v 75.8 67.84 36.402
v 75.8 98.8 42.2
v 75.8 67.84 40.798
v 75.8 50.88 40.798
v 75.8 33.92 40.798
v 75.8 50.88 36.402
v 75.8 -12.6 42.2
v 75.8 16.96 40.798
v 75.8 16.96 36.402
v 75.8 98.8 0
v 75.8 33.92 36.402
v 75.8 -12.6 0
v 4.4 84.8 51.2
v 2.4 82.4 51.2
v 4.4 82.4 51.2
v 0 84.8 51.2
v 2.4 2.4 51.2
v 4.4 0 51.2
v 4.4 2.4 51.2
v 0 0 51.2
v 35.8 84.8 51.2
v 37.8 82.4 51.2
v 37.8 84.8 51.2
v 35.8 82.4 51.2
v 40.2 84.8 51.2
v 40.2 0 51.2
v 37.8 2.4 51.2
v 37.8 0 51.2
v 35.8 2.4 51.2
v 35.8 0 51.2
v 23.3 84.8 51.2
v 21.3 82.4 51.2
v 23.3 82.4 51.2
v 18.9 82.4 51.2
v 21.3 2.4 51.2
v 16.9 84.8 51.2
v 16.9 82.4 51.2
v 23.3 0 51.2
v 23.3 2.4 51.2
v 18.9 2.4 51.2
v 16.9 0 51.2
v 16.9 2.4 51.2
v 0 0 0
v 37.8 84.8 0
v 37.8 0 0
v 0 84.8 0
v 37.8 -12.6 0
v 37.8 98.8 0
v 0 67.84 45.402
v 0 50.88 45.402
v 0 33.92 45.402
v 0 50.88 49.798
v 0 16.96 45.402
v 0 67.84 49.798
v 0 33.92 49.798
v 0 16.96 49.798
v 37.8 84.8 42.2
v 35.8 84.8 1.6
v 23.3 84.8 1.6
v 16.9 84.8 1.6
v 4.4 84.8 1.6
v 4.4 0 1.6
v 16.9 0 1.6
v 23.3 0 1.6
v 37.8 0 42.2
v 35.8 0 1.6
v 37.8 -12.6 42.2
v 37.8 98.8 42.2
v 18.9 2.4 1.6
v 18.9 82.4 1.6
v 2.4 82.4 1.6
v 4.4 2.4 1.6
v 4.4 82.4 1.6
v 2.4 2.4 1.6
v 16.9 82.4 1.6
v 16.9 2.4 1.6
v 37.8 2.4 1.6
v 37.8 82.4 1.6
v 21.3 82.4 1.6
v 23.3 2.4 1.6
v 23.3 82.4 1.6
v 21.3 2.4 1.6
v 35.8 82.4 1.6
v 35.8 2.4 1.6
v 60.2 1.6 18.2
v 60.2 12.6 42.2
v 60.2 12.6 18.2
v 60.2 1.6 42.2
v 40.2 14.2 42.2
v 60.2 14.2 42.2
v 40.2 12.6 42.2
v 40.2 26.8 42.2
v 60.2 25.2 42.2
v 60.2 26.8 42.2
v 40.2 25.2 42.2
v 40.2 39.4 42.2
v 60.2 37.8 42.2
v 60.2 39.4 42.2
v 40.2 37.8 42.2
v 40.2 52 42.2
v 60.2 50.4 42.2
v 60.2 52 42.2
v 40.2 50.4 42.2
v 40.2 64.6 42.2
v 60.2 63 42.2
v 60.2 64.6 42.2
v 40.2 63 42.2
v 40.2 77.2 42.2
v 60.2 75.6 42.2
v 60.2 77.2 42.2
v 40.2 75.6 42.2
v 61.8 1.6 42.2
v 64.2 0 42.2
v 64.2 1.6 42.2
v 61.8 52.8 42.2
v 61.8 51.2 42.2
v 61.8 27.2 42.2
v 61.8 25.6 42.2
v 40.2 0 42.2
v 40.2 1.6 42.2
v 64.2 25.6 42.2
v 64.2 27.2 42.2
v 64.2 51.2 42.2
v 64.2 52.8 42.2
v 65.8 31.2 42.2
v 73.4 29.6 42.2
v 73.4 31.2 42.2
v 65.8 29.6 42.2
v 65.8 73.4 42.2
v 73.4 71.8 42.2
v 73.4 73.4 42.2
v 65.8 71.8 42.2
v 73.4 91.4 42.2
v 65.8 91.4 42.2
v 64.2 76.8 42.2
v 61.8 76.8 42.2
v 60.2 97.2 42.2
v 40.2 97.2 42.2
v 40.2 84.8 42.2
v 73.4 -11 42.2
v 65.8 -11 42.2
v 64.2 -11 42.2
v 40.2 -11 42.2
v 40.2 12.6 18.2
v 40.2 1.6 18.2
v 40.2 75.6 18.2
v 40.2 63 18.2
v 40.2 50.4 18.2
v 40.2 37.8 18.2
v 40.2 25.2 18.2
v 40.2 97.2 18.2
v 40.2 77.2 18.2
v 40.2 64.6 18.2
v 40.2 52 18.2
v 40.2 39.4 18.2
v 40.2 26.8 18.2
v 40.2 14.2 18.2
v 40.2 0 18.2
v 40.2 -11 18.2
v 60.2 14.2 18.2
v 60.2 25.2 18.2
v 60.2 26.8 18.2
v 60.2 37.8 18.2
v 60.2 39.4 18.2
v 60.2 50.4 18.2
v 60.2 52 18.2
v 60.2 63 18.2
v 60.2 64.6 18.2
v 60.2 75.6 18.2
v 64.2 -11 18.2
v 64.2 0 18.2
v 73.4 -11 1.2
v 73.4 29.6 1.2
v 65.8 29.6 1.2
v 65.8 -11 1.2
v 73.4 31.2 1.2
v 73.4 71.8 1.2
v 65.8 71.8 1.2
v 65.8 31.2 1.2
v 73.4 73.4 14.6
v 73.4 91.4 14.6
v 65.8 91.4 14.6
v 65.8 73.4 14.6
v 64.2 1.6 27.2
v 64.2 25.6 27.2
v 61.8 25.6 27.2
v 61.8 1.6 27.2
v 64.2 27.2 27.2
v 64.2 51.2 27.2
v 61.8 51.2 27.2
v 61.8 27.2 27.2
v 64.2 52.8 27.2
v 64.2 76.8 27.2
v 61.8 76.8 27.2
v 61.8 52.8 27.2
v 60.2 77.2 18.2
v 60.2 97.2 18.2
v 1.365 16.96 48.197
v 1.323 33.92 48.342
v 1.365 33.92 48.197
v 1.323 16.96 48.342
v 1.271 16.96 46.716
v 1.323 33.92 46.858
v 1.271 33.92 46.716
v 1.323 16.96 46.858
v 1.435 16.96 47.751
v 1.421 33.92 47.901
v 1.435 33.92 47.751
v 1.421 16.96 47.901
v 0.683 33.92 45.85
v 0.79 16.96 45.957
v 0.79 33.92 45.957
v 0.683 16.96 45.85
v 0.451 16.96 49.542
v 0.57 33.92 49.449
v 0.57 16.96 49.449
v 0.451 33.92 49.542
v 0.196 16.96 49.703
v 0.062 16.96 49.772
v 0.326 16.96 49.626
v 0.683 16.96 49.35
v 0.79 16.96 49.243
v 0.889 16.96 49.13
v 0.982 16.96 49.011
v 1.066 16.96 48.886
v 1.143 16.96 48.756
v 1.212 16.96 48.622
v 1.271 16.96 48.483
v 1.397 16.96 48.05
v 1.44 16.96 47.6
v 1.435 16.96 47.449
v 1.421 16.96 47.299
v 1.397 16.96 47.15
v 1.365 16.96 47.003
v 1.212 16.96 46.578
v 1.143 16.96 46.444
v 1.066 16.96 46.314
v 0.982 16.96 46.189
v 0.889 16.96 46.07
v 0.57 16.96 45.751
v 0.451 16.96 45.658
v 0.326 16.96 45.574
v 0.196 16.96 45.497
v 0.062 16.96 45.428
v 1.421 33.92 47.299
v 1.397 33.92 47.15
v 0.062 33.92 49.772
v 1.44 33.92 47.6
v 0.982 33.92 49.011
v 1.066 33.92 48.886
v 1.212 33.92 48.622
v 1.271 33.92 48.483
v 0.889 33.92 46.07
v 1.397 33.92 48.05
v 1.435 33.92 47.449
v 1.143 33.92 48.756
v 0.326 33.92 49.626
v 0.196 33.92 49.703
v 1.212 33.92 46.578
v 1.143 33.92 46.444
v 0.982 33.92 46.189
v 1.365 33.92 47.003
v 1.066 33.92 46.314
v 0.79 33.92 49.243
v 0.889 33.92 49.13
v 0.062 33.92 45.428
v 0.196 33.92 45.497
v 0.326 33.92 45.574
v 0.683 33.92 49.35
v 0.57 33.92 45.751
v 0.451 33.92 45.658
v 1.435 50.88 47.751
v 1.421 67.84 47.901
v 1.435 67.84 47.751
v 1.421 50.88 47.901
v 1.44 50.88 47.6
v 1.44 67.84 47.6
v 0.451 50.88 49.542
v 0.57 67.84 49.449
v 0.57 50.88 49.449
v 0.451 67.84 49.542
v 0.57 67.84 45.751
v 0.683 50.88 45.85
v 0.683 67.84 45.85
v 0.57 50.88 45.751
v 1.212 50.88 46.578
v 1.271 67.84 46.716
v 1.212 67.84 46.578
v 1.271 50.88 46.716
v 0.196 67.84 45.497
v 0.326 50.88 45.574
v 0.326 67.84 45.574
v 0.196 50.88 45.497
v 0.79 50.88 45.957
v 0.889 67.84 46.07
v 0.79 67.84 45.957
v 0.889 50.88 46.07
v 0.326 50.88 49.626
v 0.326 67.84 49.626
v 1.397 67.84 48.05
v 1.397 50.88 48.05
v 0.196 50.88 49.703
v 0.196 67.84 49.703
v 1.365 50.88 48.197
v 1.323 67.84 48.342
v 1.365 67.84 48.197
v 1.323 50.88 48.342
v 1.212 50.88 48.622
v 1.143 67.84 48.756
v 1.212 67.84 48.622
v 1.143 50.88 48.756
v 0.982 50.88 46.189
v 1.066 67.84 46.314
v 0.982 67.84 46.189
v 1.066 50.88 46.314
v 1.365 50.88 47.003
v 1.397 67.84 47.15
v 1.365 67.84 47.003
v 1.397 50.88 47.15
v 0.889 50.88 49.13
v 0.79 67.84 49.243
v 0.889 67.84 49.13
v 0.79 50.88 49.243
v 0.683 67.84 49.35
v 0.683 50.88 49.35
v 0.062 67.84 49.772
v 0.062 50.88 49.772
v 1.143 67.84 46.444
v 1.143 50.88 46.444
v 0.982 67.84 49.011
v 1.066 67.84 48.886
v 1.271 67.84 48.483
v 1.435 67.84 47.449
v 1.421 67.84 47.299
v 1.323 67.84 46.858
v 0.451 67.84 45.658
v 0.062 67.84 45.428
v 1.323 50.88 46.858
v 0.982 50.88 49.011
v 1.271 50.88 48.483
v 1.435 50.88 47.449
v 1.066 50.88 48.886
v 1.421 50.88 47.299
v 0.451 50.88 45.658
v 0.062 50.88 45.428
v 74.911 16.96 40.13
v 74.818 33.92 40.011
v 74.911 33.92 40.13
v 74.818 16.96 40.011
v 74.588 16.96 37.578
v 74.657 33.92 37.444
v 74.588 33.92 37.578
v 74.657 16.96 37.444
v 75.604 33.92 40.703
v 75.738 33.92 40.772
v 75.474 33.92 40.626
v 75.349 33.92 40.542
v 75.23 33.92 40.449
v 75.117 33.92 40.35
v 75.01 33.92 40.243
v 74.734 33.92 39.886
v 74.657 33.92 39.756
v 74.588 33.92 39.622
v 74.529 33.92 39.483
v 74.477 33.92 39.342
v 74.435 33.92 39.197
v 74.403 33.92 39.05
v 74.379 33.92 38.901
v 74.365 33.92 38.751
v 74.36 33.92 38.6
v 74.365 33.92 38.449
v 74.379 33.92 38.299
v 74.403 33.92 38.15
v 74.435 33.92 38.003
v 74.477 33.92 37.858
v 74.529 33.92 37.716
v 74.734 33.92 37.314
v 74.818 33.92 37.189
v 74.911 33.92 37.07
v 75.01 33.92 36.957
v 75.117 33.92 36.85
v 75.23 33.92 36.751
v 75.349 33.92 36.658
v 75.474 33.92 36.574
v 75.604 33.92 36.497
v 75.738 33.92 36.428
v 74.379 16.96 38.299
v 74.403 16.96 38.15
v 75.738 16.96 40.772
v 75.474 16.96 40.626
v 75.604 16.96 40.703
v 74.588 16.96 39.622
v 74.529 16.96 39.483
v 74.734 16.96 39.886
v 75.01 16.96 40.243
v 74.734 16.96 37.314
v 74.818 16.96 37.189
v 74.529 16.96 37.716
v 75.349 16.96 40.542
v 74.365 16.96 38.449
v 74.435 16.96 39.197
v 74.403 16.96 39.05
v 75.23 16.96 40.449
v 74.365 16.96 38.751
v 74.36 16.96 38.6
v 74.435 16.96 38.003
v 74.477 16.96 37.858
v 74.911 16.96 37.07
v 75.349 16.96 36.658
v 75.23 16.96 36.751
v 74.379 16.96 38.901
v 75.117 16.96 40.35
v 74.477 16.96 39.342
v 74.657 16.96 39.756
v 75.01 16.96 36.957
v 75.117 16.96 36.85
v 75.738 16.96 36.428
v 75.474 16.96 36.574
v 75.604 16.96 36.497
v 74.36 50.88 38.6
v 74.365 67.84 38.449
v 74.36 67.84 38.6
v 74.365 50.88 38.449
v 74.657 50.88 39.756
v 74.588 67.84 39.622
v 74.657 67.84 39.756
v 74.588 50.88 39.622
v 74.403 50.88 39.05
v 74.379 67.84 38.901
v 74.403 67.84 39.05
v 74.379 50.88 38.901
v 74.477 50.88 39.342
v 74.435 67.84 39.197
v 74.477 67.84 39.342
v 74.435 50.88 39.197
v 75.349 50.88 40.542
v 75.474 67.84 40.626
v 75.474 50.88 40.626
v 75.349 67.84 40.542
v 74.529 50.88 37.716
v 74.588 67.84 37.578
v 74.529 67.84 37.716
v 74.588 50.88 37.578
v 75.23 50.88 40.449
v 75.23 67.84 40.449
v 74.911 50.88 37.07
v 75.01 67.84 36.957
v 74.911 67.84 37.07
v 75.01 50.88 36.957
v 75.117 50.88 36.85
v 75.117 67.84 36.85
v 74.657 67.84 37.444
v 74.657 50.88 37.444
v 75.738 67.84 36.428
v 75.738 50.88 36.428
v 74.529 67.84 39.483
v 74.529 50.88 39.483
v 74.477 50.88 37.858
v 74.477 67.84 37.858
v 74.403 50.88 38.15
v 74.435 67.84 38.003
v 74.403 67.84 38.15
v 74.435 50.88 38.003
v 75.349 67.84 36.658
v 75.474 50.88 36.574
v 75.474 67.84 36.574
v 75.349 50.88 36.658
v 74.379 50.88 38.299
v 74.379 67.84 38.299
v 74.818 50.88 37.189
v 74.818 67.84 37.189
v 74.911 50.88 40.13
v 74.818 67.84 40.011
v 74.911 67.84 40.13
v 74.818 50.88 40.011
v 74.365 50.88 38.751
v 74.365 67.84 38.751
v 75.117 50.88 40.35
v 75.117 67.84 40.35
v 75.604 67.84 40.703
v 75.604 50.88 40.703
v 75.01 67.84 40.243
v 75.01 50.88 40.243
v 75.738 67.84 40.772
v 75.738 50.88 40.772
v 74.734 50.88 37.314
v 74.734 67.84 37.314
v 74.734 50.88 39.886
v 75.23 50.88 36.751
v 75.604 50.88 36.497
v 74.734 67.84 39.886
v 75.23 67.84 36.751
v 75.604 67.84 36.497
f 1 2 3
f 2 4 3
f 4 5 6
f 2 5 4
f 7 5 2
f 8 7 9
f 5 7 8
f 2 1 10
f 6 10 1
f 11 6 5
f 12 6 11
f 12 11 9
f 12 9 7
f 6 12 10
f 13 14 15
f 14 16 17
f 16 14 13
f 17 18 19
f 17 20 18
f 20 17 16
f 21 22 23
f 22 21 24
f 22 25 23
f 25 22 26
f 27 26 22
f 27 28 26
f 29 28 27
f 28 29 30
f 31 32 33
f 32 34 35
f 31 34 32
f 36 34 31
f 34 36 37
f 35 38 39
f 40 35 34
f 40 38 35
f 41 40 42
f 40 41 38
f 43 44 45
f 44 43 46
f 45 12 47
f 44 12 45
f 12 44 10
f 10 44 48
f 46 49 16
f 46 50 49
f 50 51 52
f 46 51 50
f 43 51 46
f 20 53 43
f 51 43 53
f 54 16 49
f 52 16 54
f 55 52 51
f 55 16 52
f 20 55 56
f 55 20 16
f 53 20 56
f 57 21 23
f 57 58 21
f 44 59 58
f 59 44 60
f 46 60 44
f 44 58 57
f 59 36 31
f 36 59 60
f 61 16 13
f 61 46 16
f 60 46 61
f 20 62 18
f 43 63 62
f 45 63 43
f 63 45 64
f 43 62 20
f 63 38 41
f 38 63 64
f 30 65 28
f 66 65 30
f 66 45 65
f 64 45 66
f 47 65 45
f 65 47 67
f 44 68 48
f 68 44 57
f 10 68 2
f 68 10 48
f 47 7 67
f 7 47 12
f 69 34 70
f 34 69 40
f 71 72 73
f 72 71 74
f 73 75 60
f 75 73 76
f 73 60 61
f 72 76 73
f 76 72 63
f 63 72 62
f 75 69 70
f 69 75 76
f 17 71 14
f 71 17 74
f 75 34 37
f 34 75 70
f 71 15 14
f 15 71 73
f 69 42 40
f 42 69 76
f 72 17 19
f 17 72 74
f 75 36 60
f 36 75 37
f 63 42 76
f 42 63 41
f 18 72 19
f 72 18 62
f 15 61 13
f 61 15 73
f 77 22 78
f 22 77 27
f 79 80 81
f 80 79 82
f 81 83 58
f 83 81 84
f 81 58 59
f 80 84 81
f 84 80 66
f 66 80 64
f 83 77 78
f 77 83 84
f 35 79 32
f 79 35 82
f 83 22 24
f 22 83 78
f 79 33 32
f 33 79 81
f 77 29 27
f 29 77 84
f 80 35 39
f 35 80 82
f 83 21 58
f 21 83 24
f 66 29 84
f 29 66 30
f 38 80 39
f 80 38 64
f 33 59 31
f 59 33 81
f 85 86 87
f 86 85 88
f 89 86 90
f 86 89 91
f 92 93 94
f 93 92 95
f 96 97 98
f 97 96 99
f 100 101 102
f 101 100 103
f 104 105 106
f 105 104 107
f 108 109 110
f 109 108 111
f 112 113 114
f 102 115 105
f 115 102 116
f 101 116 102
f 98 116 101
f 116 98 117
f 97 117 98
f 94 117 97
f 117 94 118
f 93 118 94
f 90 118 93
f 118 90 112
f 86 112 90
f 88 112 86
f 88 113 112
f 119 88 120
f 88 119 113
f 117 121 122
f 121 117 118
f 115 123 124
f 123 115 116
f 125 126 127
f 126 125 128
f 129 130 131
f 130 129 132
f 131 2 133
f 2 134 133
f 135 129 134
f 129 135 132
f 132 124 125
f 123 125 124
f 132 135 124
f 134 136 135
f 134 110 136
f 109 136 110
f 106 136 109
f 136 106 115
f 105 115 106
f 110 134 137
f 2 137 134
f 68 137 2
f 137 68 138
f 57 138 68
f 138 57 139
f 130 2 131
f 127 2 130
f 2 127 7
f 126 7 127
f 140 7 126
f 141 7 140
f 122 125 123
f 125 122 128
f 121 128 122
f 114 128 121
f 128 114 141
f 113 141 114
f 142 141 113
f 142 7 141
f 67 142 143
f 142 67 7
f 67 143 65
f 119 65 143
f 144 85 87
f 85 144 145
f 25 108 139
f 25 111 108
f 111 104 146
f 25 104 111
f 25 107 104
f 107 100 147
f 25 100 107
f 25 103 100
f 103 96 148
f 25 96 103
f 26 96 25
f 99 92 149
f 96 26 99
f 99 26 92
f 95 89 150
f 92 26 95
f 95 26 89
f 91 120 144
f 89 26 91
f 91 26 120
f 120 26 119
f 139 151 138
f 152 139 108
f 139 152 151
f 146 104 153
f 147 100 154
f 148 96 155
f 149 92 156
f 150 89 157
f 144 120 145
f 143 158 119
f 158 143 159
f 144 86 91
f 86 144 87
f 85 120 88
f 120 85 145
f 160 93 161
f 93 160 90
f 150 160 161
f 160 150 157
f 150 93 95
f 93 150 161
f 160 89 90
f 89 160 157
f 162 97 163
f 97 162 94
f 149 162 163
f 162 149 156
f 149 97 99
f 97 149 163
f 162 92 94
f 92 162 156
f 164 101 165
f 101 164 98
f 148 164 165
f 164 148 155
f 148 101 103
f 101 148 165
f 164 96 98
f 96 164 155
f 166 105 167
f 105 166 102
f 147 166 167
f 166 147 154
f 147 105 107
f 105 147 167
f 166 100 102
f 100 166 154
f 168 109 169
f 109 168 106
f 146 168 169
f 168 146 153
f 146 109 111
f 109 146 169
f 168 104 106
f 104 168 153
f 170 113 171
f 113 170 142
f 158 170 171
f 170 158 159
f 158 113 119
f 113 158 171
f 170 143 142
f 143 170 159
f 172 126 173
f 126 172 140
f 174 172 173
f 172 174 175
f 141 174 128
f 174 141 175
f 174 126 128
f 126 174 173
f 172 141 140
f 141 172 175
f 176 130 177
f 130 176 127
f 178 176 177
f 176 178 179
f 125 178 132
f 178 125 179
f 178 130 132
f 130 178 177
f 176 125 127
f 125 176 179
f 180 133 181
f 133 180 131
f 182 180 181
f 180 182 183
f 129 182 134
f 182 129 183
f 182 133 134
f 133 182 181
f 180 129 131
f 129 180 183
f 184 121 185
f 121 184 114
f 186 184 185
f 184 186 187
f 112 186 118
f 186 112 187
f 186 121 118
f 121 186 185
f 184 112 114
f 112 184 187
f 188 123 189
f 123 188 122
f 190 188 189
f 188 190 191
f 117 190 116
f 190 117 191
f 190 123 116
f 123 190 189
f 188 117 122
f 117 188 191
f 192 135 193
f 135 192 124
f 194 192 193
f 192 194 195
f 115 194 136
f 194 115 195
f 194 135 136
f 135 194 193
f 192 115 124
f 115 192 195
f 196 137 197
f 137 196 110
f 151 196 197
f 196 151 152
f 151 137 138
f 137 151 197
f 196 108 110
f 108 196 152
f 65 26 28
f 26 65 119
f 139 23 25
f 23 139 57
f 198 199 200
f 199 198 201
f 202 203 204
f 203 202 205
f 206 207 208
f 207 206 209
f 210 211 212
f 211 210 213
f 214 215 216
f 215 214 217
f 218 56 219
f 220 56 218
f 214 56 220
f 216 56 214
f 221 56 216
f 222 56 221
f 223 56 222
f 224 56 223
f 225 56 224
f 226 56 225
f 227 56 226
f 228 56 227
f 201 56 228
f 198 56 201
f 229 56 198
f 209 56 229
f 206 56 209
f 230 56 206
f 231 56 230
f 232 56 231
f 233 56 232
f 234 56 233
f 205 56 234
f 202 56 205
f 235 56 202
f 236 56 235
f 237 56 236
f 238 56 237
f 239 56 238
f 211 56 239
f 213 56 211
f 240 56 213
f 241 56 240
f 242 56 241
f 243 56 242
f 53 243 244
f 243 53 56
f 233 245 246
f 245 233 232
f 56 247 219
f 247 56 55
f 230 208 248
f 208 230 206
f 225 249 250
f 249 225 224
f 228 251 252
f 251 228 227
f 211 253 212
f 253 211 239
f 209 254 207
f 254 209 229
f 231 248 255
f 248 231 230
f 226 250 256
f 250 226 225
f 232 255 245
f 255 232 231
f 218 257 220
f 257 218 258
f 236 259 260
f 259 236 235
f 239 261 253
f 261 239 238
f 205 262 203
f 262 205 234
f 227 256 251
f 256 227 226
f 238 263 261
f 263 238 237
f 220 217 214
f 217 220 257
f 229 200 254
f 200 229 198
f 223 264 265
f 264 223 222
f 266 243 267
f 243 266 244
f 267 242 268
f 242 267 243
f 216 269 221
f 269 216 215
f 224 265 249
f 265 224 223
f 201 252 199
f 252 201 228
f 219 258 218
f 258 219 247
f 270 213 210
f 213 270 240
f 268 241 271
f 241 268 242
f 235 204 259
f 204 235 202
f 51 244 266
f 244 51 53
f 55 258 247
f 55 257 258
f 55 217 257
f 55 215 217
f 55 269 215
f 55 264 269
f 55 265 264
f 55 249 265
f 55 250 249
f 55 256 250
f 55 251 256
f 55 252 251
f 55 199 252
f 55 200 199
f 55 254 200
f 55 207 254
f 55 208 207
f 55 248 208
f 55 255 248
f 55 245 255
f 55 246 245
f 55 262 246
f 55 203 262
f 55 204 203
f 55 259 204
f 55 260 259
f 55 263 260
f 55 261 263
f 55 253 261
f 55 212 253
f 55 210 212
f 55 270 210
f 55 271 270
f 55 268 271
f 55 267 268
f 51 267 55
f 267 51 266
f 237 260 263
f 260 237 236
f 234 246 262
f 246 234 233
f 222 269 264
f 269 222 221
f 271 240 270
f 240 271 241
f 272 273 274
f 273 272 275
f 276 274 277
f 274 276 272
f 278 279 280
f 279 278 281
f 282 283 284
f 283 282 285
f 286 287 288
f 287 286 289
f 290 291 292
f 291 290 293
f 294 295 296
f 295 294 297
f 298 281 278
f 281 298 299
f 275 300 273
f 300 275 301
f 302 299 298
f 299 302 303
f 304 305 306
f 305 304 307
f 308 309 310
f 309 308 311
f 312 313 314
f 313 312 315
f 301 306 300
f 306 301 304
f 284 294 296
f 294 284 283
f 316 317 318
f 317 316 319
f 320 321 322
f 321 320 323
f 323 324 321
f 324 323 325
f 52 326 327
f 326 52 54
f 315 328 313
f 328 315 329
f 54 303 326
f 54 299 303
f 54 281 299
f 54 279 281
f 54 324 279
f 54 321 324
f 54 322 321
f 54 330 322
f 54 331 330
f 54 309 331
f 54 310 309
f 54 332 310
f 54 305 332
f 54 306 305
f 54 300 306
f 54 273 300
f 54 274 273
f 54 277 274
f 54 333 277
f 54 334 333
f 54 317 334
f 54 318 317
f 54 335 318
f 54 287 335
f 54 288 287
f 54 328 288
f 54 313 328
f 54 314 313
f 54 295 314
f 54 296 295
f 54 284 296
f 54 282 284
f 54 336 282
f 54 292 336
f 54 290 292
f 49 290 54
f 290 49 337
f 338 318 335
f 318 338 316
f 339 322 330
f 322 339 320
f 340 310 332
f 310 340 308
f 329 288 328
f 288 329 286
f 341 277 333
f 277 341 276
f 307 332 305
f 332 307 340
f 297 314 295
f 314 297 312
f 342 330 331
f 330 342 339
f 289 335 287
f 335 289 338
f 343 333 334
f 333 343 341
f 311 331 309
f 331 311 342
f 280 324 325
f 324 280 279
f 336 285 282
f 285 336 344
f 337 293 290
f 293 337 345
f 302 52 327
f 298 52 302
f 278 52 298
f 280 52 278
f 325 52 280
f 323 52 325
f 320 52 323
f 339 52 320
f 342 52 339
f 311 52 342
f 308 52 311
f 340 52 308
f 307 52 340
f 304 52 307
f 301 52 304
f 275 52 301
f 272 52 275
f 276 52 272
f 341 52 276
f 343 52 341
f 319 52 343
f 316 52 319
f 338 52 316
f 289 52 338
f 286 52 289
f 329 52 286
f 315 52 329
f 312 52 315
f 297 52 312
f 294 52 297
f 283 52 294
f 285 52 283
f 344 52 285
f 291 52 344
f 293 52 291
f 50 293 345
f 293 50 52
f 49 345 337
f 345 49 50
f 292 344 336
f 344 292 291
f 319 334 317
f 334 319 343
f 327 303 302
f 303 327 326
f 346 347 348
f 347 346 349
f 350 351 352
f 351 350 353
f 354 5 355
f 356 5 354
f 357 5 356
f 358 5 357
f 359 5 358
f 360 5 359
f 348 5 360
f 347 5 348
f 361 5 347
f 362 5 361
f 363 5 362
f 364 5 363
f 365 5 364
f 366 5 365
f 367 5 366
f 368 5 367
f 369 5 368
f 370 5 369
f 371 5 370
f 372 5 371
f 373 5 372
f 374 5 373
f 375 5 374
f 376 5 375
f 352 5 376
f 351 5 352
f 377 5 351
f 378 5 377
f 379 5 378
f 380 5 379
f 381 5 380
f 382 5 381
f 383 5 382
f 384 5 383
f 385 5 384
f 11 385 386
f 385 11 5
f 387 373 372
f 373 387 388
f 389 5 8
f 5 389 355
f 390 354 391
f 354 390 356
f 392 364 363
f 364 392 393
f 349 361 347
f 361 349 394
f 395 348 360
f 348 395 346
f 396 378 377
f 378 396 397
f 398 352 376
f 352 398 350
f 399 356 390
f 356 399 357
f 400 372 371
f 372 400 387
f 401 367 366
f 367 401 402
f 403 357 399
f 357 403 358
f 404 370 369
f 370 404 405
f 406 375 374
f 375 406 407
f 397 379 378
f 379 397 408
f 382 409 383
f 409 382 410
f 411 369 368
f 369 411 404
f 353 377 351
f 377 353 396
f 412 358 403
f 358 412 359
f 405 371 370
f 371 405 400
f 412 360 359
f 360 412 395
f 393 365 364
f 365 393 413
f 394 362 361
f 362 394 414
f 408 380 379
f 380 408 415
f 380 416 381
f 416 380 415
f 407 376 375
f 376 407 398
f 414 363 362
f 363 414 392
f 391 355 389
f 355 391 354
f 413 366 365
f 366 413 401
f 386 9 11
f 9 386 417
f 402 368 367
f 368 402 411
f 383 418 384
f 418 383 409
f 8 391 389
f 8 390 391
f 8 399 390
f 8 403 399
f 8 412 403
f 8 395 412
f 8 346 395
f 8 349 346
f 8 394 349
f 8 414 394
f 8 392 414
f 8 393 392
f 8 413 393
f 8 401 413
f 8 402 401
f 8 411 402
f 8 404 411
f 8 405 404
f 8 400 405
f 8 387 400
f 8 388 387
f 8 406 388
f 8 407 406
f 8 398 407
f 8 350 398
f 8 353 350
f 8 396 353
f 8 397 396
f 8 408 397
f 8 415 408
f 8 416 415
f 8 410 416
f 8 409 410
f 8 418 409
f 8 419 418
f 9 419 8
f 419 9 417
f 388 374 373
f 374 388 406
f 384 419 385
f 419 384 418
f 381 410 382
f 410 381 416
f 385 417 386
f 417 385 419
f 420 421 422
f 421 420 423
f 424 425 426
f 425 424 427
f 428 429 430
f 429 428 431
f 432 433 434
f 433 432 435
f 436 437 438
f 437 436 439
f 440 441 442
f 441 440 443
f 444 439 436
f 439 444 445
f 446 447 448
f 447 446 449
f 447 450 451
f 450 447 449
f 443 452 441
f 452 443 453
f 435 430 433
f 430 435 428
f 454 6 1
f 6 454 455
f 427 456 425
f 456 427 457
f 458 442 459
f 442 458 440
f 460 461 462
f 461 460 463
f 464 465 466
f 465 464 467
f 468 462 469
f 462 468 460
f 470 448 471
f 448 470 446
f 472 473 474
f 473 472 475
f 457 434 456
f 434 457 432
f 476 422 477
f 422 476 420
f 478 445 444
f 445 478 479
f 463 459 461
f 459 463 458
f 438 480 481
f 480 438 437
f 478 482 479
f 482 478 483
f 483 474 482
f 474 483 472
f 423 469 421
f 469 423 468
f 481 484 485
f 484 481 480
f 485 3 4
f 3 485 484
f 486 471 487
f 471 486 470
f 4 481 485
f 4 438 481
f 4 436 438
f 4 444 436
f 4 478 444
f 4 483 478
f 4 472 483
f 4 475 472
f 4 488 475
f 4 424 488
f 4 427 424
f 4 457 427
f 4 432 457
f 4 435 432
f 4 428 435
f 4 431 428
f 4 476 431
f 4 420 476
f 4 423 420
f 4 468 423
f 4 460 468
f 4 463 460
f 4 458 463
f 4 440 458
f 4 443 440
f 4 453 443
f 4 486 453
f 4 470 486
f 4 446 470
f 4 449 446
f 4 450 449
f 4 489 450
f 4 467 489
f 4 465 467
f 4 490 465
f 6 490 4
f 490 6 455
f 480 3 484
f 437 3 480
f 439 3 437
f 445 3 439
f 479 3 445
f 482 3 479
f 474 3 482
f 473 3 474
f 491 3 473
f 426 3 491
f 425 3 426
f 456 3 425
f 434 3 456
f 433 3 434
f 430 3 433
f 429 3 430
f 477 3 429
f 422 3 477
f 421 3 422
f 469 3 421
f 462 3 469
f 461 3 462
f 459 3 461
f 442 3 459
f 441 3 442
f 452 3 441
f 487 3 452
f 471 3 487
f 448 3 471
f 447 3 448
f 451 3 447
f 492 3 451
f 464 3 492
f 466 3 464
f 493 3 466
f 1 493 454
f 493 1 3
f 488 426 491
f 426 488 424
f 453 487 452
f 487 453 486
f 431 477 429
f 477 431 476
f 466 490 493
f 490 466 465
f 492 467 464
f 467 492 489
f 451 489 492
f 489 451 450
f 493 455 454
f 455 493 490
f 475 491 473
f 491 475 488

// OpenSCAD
// Written by xoque (mwifall@gmail.com)
/**************************************
Organizer for ESCAPE items - dice, meeples, character 
tokens, ghost, chalice, gems, and quest tokens
**************************************/

Thickness=1.6;  // Thickness of normal walls
ThicknessW=2.4; // Thickness of walls that the cover snaps into
Edge=2; // The edge of the dice storage
// Dice dimensions
DiceWidth=16.5;
// Meeple dimensions
MLength=20;
MWidth=11; 
MHeight=24;
MCutoff=9; // cutoff above meeples
// Ghost dimensions
GLength=24;
// Player token dimensions
PLength=40.6; //41
PWidth=7.6;
PThickness=1.2;  // Walls around player tokens
// Chalice dimensions
CDiameter=20;

// Quest marker dimensions
QDiameter=24;
QThickness=2.4;

// Gem token dimensions
GemLength=35;
GemWidth=18;

TLength=84.8;
//TotalLength=TLength+MWidth+2*Thickness+CDiameter;
TotalLength=9*Thickness+7*MWidth+CDiameter;
TWidth=4*ThicknessW+Thickness+2*DiceWidth+GLength+PWidth;
THeight=51.2;

// meeple hole = 20 x 11 x 21h (meeple is 30h)
// oval = 50 x 40 x 2.14

difference(){
    union() {
        cube([TWidth,TLength,THeight]);
        translate([2*DiceWidth+2*ThicknessW,-Thickness-MWidth,0]) {
            cube([GLength+2*ThicknessW+Thickness+PWidth,TotalLength,THeight]); }
    }
    translate([ThicknessW,ThicknessW,Thickness]) {
        cube([DiceWidth,TLength-2*ThicknessW,THeight]); }
    translate([ThicknessW+Edge,0,Thickness]) {
        cube([DiceWidth-2*Edge,TLength,THeight]); }
    translate([DiceWidth+2*ThicknessW,ThicknessW,Thickness]) {
        cube([DiceWidth,TLength-2*ThicknessW,THeight]); }
    translate([DiceWidth+2*ThicknessW+Edge,0,Thickness]) {
        cube([DiceWidth-2*Edge,TLength,THeight]); }

//Meeple cutouts
    translate([2*DiceWidth+3*ThicknessW,Thickness,THeight-MHeight-MCutoff]) {
        cube([MLength,MWidth,MHeight]); }
    translate([2*DiceWidth+3*ThicknessW,2*Thickness+MWidth,THeight-MHeight-MCutoff]) {
        cube([MLength,MWidth,MHeight]); }
    translate([2*DiceWidth+3*ThicknessW,3*Thickness+2*MWidth,THeight-MHeight-MCutoff]) {
        cube([MLength,MWidth,MHeight]); }
    translate([2*DiceWidth+3*ThicknessW,4*Thickness+3*MWidth,THeight-MHeight-MCutoff]) {
        cube([MLength,MWidth,MHeight]); }
    translate([2*DiceWidth+3*ThicknessW,5*Thickness+4*MWidth,THeight-MHeight-MCutoff]) {
        cube([MLength,MWidth,MHeight]); }
    translate([2*DiceWidth+3*ThicknessW,6*Thickness+5*MWidth,THeight-MHeight-MCutoff]) {
        cube([MLength,MWidth,MHeight]); }

// Ghost cutouts
    translate([2*DiceWidth+3*ThicknessW,-MWidth,THeight-MHeight-MCutoff]) {
        cube([GLength,MWidth,MHeight]); }

// Player adventurer token cutouts
    translate([2*DiceWidth+3*ThicknessW+Thickness+GLength,-MWidth,PThickness]) {
        cube([PWidth,PLength,THeight]); }
    translate([2*DiceWidth+3*ThicknessW+Thickness+GLength,-MWidth+Thickness+PLength,PThickness]) {
        cube([PWidth,PLength,THeight]); }

// Gem token cutout
    translate([2*DiceWidth+3*ThicknessW+Thickness+GLength,-MWidth+2*Thickness+2*PLength,THeight-GemLength-Thickness]) {
        cube([PWidth,GemWidth,THeight]); }

// Quest token cutout
    translate([2*DiceWidth+3*ThicknessW+MLength+Thickness,Thickness,THeight-QDiameter]) {
        cube([QThickness,QDiameter,QDiameter]); }
    translate([2*DiceWidth+3*ThicknessW+MLength+Thickness,QDiameter+2*Thickness,THeight-QDiameter]) {
        cube([QThickness,QDiameter,QDiameter]); }
    translate([2*DiceWidth+3*ThicknessW+MLength+Thickness,2*QDiameter+3*Thickness,THeight-QDiameter]) {
        cube([QThickness,QDiameter,QDiameter]); }

// Chalice cutout
    translate([2*DiceWidth+3*ThicknessW,7*Thickness+6*MWidth,THeight-MHeight-MCutoff]) {
        cube([CDiameter,CDiameter,MHeight]); }

// Cutoff the top of the meeple area
    translate([2*DiceWidth+3*ThicknessW,-Thickness-MWidth,THeight-MCutoff]) {
        cube([GLength+ThicknessW+Thickness+PWidth,TotalLength,MCutoff]); }
    translate([2*DiceWidth+2*ThicknessW,-Thickness-MWidth,THeight-MCutoff]) {
        cube([GLength+ThicknessW+Thickness+PWidth,MWidth+Thickness,MCutoff]); }
    translate([2*DiceWidth+2*ThicknessW,TLength,THeight-MCutoff]) {
        cube([GLength+ThicknessW+Thickness+PWidth,CDiameter,MCutoff]); }

// Snap fit holes
    translate([ThicknessW-ThicknessW*1.4,TLength/5*2,THeight-ThicknessW*1.5]) rotate([90,0,0]) cylinder($fn = 100, r = ThicknessW, h = TLength/5);
    translate([ThicknessW-ThicknessW*1.4,TLength/5*4,THeight-ThicknessW*1.5]) rotate([90,0,0]) cylinder($fn = 100, r = ThicknessW, h = TLength/5);

    translate([TWidth-ThicknessW+ThicknessW*1.4,TLength/5*2,THeight-MCutoff-ThicknessW*1.5]) rotate([90,0,0]) cylinder($fn = 100, r = ThicknessW, h = TLength/5);
    translate([TWidth-ThicknessW+ThicknessW*1.4,TLength/5*4,THeight-MCutoff-ThicknessW*1.5]) rotate([90,0,0]) cylinder($fn = 100, r = ThicknessW, h = TLength/5);

}
